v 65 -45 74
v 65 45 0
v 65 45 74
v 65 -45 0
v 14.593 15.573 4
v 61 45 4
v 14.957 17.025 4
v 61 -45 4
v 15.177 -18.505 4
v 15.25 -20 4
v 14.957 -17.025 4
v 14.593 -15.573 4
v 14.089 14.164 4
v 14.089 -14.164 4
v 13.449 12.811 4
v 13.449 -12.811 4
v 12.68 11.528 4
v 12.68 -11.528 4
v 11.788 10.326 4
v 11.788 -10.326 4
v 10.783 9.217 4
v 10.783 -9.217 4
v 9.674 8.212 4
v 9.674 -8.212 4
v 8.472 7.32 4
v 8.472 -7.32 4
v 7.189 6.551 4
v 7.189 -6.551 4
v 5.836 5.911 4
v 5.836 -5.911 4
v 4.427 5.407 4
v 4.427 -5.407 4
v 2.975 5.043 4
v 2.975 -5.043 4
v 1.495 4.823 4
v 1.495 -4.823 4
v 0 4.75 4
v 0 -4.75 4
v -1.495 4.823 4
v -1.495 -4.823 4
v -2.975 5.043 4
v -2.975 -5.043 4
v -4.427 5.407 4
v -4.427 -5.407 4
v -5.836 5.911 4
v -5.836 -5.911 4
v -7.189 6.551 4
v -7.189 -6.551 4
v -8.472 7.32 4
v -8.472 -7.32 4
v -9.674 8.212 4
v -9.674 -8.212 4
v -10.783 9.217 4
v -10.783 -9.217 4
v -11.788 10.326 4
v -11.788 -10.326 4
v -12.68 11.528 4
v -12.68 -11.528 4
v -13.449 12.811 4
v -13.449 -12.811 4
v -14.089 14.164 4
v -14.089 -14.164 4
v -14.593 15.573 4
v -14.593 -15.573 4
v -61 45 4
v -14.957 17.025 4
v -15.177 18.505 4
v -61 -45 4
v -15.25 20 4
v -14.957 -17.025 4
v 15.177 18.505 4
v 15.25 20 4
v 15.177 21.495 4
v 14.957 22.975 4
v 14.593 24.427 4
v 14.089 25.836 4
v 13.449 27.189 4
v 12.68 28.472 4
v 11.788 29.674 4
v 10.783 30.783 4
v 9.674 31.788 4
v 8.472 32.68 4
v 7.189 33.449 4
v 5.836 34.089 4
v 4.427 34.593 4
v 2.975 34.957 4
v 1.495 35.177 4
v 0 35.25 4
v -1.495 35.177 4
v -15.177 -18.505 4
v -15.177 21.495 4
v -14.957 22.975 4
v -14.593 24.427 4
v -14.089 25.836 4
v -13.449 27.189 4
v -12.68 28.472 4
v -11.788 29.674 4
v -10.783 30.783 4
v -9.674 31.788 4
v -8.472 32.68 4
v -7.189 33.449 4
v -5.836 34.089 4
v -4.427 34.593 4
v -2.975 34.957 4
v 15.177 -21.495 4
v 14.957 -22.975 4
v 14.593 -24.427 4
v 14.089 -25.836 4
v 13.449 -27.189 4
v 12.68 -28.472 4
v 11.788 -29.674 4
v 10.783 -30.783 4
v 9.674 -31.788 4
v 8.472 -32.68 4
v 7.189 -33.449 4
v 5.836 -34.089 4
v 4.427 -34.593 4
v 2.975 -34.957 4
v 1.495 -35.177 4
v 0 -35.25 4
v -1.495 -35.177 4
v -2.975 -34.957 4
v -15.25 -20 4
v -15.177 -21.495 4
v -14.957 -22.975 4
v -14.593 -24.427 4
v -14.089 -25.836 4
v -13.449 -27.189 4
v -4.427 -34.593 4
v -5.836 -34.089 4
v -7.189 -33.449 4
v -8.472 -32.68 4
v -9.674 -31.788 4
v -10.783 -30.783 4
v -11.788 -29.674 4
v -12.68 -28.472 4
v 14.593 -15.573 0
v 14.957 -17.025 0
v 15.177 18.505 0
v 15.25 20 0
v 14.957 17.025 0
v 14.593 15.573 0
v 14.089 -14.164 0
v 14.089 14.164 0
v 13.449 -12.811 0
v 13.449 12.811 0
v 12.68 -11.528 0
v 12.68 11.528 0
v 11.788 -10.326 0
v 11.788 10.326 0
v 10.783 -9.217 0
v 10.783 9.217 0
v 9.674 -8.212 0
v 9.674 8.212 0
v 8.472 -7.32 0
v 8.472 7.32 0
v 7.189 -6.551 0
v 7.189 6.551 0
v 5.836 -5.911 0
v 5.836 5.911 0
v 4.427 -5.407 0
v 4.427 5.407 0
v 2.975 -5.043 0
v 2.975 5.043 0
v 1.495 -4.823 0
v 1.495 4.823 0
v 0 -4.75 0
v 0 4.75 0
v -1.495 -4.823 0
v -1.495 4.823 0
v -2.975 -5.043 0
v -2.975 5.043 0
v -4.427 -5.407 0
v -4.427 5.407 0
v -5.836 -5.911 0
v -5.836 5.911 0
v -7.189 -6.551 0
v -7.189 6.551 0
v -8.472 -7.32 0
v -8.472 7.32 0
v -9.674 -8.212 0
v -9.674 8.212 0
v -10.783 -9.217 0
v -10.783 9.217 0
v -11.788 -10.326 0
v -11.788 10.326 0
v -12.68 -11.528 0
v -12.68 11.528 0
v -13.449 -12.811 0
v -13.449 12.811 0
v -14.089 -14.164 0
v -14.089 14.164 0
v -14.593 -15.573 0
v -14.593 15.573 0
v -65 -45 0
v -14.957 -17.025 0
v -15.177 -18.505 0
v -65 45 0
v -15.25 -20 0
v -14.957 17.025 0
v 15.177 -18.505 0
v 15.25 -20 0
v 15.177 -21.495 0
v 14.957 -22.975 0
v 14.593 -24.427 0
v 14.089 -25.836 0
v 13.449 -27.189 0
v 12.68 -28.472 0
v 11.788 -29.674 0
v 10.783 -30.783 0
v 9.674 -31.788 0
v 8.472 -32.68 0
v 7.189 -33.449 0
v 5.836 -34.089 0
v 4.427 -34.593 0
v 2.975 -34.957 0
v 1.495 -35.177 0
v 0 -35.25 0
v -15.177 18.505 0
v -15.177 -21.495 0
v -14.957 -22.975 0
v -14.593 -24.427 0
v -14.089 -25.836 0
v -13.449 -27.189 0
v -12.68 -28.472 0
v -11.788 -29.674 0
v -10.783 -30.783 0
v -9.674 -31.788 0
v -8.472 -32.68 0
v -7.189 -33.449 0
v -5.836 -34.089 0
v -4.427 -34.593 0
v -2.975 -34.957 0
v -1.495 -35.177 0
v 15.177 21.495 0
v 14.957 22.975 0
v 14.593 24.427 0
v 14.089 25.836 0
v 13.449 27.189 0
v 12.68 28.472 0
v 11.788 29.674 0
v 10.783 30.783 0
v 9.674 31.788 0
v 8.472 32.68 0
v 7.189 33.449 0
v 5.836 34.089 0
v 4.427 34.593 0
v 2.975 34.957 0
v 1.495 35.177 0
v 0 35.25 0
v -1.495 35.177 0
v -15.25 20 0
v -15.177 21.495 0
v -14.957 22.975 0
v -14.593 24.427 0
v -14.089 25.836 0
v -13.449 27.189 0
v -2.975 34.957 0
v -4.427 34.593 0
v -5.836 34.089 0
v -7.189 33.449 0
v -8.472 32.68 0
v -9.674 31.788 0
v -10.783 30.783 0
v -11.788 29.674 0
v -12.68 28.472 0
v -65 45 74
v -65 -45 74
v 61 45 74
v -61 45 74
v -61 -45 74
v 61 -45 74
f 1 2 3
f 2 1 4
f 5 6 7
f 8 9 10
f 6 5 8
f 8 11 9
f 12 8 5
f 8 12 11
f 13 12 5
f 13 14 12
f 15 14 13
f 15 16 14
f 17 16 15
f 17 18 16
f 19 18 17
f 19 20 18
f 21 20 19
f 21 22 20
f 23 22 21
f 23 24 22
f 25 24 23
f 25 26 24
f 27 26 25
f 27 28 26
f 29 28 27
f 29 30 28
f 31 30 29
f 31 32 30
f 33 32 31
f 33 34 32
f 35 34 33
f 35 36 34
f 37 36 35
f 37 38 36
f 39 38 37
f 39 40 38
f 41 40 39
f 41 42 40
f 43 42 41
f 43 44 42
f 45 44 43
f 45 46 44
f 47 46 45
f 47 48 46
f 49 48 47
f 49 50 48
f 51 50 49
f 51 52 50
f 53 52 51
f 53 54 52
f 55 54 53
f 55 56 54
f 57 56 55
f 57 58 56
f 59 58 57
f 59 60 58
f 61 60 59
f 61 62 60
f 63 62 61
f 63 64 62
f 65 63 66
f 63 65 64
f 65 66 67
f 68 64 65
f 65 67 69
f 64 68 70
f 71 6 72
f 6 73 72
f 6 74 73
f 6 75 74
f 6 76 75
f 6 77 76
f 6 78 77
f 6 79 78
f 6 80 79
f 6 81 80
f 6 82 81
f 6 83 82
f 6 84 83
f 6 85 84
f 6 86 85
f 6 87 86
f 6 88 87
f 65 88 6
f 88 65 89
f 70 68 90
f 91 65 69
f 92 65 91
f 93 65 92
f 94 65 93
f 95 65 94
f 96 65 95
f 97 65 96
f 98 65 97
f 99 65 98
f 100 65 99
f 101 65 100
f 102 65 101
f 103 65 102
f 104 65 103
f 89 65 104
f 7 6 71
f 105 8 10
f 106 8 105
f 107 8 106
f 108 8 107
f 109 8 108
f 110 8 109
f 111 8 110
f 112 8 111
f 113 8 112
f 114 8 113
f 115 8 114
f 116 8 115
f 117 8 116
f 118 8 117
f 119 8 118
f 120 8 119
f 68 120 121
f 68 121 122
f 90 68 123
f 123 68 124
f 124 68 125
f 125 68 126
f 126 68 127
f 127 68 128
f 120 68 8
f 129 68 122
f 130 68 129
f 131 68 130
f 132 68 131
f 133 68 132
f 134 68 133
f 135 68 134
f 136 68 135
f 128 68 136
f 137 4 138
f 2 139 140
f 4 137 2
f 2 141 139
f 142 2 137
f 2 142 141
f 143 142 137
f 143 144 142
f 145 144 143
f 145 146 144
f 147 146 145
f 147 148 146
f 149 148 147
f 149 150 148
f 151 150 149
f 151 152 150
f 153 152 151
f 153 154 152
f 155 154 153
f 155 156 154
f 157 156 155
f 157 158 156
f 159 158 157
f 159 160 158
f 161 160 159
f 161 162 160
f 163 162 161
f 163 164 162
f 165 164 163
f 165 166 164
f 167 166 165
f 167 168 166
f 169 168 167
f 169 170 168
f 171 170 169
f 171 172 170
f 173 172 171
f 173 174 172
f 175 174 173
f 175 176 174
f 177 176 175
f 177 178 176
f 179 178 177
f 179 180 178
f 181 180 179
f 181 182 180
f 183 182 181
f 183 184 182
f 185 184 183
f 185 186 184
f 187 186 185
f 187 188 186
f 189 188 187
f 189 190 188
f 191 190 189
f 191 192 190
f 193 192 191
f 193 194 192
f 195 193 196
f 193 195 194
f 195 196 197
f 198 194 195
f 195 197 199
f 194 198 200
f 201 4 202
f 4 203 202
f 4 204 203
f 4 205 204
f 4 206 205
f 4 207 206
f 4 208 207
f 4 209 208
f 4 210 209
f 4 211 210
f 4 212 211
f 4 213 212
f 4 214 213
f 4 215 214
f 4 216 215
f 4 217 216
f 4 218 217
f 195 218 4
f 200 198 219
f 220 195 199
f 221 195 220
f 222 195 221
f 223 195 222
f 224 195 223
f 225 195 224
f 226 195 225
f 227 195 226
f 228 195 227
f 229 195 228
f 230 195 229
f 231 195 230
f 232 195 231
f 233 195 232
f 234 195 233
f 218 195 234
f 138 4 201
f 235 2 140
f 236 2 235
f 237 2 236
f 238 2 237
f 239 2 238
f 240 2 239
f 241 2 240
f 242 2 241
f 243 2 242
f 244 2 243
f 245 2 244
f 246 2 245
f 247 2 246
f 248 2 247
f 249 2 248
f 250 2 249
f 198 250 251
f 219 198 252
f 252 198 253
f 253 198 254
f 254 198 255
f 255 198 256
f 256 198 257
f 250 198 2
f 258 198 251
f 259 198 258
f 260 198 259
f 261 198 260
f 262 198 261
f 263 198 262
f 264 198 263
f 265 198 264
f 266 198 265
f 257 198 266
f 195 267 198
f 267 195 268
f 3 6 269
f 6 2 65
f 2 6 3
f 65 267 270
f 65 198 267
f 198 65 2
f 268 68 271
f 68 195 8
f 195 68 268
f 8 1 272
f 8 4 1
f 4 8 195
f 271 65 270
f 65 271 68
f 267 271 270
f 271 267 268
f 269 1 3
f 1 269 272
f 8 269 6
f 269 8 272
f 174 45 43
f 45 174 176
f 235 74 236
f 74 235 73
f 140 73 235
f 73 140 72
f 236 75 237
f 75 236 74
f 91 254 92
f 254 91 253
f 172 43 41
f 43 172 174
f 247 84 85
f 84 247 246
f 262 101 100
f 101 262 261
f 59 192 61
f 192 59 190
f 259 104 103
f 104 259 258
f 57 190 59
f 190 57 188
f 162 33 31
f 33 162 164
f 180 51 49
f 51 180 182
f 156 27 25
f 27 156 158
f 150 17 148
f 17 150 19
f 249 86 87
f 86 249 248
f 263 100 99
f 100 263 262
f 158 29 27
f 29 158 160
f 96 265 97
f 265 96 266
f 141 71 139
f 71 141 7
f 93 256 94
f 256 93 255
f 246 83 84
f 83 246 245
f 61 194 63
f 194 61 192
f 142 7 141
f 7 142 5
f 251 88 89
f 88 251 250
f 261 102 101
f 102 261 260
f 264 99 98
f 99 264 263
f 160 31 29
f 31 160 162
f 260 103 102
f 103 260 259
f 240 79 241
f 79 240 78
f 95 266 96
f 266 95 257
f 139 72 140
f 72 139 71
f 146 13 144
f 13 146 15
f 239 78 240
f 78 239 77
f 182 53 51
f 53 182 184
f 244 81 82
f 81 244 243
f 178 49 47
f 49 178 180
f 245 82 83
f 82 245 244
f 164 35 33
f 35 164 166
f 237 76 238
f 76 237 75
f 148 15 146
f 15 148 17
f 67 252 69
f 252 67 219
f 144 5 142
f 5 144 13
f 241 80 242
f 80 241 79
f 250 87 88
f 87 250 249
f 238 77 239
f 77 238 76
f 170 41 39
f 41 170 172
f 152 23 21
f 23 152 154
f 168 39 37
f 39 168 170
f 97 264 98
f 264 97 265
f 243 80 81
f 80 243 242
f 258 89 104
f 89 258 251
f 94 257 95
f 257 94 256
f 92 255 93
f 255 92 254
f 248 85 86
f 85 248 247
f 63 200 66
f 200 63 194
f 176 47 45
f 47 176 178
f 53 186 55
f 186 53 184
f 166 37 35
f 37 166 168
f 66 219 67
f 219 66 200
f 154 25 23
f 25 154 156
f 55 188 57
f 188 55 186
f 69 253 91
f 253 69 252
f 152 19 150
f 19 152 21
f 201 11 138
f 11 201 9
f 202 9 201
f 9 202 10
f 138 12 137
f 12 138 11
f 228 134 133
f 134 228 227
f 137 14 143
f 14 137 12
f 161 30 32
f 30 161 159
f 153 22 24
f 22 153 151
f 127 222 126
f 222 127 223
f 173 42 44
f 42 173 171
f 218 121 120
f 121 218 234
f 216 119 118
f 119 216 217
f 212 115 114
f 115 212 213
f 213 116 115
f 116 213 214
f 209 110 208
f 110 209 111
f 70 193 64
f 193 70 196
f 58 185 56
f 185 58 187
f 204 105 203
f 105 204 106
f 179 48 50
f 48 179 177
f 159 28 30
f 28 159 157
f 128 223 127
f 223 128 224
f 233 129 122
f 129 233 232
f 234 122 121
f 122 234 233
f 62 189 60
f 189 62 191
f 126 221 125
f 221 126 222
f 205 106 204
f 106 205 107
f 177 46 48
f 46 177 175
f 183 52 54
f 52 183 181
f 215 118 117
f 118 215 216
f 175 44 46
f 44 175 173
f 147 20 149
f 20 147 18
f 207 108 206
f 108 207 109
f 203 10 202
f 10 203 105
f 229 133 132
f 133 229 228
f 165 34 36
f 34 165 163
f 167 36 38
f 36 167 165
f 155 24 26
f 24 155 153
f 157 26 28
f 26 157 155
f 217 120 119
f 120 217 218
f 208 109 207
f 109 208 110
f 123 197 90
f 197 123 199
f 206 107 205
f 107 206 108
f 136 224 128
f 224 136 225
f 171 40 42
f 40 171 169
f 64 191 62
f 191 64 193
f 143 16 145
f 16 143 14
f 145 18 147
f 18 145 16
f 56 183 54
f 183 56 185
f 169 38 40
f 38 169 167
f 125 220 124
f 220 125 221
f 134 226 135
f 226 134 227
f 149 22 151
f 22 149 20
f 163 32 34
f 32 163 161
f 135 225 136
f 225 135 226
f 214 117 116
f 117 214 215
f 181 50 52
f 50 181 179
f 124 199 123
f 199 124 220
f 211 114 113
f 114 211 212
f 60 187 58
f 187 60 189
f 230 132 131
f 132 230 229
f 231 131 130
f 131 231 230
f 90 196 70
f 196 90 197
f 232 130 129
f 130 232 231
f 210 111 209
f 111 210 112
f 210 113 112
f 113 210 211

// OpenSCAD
// Rack for six 50 mL conical (Falcon-type) tubes.
// Print orientation: Flat plate on bed (z=0), walls rising to z=70.
// After printing, flip over so walls are on the bed and tubes hang down.

// Plate dimensions
L     = 130; // Length (X)
W     = 90;  // Width (Y)
t     = 4;   // Plate thickness (Z)

// Hole specifications
n_holes = 6;
hole_d  = 30.5;

// Grid layout
row_spacing = 40; // Centre-to-centre Y
col_spacing = 40; // Centre-to-centre X

// Wall specifications
wall_h = 70; // Height of walls from plate top (z=4)
wall_t = 4;  // Thickness of walls (Y)

// Derived positions
// Centred on origin in X and Y
x_offset = (n_holes / 2 - 0.5) * col_spacing;
y_offset = (2 / 2 - 0.5) * row_spacing;

// Calculate specific hole positions
hole_positions = [
    [x_offset, y_offset],
    [x_offset, -y_offset],
    [-x_offset, y_offset],
    [-x_offset, -y_offset],
    [0, y_offset],
    [0, -y_offset]
];

$fn = 64;

module tube_hole(x, y) {
    translate([x, y, 0]) cylinder(h = t + 1, d = hole_d);
}

difference() {
    union() {
        // 1. The flat base plate
        translate([-L / 2, -W / 2, 0]) cube([L, W, t]);

        // 2. The two side walls
        // Left wall (at -L/2)
        translate([-L / 2, -W / 2, t]) cube([wall_t, W, wall_h]);
        // Right wall (at +L/2)
        translate([L / 2 - wall_t, -W / 2, t]) cube([wall_t, W, wall_h]);
    }

    // Cut the holes for the tubes
    for (p = hole_positions) {
        tube_hole(p[0], p[1]);
    }
}
